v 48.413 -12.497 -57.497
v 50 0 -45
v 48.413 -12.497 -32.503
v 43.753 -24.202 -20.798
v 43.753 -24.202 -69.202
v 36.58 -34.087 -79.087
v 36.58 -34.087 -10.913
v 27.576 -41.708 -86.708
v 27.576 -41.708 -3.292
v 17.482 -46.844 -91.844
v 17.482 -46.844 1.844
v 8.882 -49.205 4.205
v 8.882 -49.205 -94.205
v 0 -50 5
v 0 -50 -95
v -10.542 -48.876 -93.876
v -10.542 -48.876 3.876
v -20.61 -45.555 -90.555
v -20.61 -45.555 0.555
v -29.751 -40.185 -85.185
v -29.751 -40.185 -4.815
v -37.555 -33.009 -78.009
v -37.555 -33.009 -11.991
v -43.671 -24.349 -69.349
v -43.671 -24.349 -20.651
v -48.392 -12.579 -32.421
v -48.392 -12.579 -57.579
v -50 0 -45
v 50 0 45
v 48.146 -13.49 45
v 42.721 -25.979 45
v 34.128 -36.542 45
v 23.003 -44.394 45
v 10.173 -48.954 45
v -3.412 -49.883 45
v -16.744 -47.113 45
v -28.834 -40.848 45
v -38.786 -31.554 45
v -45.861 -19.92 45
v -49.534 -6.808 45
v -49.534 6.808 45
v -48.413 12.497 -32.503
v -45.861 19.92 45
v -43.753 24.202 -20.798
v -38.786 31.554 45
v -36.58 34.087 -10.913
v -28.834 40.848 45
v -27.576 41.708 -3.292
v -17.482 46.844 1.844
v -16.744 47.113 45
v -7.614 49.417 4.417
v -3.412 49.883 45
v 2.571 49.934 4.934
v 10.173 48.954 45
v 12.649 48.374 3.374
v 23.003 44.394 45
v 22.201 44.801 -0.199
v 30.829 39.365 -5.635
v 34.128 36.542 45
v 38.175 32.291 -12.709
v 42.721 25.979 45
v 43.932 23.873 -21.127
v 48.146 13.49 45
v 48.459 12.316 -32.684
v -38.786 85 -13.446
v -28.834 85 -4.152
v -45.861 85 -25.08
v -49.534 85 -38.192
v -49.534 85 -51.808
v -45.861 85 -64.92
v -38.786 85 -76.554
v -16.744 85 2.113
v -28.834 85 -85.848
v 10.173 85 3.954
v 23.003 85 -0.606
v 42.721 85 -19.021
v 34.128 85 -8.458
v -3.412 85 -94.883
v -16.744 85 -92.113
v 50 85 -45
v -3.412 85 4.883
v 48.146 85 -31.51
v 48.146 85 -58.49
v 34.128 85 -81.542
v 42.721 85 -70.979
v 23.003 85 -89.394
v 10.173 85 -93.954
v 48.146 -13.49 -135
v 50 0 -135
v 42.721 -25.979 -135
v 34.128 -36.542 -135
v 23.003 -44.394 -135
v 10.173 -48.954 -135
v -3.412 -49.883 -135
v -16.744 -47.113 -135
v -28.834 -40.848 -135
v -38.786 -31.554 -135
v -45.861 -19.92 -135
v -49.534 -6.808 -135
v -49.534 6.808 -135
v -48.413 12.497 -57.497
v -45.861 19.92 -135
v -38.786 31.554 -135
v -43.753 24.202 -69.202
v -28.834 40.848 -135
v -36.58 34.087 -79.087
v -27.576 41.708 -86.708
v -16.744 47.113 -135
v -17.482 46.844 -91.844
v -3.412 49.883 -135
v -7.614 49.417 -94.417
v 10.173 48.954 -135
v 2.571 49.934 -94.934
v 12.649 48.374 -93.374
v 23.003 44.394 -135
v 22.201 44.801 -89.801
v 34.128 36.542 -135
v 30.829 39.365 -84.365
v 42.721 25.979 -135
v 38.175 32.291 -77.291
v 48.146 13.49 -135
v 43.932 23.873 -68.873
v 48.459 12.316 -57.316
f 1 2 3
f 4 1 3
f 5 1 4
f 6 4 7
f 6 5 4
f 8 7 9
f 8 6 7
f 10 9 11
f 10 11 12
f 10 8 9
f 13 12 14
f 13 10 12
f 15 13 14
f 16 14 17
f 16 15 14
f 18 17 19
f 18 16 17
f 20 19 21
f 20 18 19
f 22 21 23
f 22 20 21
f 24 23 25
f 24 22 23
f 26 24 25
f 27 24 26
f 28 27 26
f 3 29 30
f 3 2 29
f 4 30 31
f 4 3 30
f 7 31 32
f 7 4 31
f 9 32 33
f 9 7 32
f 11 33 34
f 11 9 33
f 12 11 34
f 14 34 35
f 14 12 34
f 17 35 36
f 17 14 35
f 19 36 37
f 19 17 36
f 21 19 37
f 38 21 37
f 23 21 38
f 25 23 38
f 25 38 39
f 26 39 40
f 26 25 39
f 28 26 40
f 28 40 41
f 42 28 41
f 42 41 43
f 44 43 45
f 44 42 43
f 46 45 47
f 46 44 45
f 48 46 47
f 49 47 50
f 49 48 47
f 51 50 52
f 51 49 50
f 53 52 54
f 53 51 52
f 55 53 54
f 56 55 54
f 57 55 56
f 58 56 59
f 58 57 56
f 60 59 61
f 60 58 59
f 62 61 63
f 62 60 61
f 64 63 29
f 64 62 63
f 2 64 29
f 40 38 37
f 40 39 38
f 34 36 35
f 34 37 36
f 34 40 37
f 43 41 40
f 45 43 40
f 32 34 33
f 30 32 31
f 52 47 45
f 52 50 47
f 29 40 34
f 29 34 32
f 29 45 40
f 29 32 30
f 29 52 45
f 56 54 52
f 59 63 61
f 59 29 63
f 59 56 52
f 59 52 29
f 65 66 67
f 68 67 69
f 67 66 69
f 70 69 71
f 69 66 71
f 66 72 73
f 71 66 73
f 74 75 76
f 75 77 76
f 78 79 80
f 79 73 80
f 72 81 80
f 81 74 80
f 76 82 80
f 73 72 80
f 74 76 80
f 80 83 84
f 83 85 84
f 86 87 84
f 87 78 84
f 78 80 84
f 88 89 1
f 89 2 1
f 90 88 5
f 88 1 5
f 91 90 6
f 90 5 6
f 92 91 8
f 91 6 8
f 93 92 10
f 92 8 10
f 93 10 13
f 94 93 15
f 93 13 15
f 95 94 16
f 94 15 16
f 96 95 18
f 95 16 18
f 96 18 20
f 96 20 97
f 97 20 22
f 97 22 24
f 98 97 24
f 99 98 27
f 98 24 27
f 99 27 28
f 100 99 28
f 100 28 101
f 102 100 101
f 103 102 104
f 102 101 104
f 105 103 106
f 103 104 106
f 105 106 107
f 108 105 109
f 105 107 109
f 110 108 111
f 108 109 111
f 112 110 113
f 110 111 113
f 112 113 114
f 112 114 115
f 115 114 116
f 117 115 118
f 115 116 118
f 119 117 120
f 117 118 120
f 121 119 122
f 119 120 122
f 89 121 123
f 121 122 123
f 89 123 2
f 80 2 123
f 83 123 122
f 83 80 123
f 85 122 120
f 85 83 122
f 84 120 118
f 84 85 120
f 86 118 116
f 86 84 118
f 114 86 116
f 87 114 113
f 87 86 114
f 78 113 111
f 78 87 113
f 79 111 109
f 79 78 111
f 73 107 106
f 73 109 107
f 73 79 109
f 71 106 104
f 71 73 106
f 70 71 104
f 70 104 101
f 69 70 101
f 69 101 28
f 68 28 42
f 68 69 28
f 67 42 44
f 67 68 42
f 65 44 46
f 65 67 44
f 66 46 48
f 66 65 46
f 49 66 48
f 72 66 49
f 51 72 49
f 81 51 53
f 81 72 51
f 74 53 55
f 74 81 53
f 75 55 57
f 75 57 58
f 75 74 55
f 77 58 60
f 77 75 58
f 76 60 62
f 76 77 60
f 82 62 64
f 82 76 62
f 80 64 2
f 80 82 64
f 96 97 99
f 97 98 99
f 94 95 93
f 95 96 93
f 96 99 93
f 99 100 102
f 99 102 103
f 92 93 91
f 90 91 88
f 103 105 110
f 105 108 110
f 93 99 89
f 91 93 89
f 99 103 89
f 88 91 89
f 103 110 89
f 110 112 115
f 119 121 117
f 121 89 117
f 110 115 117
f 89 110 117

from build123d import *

# Parameters (mm, degrees)
SKETCH2_R = 50


with BuildPart() as part:
    # Sweep1: sweep along a path in Sketch1
    with BuildLine(Plane(origin=(0, 0, 0), x_dir=(0, 0, -1), z_dir=(1, 0, 0))) as sweep1_path:
        Line((-45, 0), (45, 0))
        Line((45, 0), (45, 85))
    # Sketch2 → Sweep1 (sweep)
    with BuildSketch(Plane.XY.offset(45)):
        Circle(SKETCH2_R)
    sweep1 = sweep(path=sweep1_path.line, transition=Transition.RIGHT)

    # Mirror2: Sweep1 across plane
    add(sweep1.mirror(Plane.XY.offset(-45)))


solid = part.part
